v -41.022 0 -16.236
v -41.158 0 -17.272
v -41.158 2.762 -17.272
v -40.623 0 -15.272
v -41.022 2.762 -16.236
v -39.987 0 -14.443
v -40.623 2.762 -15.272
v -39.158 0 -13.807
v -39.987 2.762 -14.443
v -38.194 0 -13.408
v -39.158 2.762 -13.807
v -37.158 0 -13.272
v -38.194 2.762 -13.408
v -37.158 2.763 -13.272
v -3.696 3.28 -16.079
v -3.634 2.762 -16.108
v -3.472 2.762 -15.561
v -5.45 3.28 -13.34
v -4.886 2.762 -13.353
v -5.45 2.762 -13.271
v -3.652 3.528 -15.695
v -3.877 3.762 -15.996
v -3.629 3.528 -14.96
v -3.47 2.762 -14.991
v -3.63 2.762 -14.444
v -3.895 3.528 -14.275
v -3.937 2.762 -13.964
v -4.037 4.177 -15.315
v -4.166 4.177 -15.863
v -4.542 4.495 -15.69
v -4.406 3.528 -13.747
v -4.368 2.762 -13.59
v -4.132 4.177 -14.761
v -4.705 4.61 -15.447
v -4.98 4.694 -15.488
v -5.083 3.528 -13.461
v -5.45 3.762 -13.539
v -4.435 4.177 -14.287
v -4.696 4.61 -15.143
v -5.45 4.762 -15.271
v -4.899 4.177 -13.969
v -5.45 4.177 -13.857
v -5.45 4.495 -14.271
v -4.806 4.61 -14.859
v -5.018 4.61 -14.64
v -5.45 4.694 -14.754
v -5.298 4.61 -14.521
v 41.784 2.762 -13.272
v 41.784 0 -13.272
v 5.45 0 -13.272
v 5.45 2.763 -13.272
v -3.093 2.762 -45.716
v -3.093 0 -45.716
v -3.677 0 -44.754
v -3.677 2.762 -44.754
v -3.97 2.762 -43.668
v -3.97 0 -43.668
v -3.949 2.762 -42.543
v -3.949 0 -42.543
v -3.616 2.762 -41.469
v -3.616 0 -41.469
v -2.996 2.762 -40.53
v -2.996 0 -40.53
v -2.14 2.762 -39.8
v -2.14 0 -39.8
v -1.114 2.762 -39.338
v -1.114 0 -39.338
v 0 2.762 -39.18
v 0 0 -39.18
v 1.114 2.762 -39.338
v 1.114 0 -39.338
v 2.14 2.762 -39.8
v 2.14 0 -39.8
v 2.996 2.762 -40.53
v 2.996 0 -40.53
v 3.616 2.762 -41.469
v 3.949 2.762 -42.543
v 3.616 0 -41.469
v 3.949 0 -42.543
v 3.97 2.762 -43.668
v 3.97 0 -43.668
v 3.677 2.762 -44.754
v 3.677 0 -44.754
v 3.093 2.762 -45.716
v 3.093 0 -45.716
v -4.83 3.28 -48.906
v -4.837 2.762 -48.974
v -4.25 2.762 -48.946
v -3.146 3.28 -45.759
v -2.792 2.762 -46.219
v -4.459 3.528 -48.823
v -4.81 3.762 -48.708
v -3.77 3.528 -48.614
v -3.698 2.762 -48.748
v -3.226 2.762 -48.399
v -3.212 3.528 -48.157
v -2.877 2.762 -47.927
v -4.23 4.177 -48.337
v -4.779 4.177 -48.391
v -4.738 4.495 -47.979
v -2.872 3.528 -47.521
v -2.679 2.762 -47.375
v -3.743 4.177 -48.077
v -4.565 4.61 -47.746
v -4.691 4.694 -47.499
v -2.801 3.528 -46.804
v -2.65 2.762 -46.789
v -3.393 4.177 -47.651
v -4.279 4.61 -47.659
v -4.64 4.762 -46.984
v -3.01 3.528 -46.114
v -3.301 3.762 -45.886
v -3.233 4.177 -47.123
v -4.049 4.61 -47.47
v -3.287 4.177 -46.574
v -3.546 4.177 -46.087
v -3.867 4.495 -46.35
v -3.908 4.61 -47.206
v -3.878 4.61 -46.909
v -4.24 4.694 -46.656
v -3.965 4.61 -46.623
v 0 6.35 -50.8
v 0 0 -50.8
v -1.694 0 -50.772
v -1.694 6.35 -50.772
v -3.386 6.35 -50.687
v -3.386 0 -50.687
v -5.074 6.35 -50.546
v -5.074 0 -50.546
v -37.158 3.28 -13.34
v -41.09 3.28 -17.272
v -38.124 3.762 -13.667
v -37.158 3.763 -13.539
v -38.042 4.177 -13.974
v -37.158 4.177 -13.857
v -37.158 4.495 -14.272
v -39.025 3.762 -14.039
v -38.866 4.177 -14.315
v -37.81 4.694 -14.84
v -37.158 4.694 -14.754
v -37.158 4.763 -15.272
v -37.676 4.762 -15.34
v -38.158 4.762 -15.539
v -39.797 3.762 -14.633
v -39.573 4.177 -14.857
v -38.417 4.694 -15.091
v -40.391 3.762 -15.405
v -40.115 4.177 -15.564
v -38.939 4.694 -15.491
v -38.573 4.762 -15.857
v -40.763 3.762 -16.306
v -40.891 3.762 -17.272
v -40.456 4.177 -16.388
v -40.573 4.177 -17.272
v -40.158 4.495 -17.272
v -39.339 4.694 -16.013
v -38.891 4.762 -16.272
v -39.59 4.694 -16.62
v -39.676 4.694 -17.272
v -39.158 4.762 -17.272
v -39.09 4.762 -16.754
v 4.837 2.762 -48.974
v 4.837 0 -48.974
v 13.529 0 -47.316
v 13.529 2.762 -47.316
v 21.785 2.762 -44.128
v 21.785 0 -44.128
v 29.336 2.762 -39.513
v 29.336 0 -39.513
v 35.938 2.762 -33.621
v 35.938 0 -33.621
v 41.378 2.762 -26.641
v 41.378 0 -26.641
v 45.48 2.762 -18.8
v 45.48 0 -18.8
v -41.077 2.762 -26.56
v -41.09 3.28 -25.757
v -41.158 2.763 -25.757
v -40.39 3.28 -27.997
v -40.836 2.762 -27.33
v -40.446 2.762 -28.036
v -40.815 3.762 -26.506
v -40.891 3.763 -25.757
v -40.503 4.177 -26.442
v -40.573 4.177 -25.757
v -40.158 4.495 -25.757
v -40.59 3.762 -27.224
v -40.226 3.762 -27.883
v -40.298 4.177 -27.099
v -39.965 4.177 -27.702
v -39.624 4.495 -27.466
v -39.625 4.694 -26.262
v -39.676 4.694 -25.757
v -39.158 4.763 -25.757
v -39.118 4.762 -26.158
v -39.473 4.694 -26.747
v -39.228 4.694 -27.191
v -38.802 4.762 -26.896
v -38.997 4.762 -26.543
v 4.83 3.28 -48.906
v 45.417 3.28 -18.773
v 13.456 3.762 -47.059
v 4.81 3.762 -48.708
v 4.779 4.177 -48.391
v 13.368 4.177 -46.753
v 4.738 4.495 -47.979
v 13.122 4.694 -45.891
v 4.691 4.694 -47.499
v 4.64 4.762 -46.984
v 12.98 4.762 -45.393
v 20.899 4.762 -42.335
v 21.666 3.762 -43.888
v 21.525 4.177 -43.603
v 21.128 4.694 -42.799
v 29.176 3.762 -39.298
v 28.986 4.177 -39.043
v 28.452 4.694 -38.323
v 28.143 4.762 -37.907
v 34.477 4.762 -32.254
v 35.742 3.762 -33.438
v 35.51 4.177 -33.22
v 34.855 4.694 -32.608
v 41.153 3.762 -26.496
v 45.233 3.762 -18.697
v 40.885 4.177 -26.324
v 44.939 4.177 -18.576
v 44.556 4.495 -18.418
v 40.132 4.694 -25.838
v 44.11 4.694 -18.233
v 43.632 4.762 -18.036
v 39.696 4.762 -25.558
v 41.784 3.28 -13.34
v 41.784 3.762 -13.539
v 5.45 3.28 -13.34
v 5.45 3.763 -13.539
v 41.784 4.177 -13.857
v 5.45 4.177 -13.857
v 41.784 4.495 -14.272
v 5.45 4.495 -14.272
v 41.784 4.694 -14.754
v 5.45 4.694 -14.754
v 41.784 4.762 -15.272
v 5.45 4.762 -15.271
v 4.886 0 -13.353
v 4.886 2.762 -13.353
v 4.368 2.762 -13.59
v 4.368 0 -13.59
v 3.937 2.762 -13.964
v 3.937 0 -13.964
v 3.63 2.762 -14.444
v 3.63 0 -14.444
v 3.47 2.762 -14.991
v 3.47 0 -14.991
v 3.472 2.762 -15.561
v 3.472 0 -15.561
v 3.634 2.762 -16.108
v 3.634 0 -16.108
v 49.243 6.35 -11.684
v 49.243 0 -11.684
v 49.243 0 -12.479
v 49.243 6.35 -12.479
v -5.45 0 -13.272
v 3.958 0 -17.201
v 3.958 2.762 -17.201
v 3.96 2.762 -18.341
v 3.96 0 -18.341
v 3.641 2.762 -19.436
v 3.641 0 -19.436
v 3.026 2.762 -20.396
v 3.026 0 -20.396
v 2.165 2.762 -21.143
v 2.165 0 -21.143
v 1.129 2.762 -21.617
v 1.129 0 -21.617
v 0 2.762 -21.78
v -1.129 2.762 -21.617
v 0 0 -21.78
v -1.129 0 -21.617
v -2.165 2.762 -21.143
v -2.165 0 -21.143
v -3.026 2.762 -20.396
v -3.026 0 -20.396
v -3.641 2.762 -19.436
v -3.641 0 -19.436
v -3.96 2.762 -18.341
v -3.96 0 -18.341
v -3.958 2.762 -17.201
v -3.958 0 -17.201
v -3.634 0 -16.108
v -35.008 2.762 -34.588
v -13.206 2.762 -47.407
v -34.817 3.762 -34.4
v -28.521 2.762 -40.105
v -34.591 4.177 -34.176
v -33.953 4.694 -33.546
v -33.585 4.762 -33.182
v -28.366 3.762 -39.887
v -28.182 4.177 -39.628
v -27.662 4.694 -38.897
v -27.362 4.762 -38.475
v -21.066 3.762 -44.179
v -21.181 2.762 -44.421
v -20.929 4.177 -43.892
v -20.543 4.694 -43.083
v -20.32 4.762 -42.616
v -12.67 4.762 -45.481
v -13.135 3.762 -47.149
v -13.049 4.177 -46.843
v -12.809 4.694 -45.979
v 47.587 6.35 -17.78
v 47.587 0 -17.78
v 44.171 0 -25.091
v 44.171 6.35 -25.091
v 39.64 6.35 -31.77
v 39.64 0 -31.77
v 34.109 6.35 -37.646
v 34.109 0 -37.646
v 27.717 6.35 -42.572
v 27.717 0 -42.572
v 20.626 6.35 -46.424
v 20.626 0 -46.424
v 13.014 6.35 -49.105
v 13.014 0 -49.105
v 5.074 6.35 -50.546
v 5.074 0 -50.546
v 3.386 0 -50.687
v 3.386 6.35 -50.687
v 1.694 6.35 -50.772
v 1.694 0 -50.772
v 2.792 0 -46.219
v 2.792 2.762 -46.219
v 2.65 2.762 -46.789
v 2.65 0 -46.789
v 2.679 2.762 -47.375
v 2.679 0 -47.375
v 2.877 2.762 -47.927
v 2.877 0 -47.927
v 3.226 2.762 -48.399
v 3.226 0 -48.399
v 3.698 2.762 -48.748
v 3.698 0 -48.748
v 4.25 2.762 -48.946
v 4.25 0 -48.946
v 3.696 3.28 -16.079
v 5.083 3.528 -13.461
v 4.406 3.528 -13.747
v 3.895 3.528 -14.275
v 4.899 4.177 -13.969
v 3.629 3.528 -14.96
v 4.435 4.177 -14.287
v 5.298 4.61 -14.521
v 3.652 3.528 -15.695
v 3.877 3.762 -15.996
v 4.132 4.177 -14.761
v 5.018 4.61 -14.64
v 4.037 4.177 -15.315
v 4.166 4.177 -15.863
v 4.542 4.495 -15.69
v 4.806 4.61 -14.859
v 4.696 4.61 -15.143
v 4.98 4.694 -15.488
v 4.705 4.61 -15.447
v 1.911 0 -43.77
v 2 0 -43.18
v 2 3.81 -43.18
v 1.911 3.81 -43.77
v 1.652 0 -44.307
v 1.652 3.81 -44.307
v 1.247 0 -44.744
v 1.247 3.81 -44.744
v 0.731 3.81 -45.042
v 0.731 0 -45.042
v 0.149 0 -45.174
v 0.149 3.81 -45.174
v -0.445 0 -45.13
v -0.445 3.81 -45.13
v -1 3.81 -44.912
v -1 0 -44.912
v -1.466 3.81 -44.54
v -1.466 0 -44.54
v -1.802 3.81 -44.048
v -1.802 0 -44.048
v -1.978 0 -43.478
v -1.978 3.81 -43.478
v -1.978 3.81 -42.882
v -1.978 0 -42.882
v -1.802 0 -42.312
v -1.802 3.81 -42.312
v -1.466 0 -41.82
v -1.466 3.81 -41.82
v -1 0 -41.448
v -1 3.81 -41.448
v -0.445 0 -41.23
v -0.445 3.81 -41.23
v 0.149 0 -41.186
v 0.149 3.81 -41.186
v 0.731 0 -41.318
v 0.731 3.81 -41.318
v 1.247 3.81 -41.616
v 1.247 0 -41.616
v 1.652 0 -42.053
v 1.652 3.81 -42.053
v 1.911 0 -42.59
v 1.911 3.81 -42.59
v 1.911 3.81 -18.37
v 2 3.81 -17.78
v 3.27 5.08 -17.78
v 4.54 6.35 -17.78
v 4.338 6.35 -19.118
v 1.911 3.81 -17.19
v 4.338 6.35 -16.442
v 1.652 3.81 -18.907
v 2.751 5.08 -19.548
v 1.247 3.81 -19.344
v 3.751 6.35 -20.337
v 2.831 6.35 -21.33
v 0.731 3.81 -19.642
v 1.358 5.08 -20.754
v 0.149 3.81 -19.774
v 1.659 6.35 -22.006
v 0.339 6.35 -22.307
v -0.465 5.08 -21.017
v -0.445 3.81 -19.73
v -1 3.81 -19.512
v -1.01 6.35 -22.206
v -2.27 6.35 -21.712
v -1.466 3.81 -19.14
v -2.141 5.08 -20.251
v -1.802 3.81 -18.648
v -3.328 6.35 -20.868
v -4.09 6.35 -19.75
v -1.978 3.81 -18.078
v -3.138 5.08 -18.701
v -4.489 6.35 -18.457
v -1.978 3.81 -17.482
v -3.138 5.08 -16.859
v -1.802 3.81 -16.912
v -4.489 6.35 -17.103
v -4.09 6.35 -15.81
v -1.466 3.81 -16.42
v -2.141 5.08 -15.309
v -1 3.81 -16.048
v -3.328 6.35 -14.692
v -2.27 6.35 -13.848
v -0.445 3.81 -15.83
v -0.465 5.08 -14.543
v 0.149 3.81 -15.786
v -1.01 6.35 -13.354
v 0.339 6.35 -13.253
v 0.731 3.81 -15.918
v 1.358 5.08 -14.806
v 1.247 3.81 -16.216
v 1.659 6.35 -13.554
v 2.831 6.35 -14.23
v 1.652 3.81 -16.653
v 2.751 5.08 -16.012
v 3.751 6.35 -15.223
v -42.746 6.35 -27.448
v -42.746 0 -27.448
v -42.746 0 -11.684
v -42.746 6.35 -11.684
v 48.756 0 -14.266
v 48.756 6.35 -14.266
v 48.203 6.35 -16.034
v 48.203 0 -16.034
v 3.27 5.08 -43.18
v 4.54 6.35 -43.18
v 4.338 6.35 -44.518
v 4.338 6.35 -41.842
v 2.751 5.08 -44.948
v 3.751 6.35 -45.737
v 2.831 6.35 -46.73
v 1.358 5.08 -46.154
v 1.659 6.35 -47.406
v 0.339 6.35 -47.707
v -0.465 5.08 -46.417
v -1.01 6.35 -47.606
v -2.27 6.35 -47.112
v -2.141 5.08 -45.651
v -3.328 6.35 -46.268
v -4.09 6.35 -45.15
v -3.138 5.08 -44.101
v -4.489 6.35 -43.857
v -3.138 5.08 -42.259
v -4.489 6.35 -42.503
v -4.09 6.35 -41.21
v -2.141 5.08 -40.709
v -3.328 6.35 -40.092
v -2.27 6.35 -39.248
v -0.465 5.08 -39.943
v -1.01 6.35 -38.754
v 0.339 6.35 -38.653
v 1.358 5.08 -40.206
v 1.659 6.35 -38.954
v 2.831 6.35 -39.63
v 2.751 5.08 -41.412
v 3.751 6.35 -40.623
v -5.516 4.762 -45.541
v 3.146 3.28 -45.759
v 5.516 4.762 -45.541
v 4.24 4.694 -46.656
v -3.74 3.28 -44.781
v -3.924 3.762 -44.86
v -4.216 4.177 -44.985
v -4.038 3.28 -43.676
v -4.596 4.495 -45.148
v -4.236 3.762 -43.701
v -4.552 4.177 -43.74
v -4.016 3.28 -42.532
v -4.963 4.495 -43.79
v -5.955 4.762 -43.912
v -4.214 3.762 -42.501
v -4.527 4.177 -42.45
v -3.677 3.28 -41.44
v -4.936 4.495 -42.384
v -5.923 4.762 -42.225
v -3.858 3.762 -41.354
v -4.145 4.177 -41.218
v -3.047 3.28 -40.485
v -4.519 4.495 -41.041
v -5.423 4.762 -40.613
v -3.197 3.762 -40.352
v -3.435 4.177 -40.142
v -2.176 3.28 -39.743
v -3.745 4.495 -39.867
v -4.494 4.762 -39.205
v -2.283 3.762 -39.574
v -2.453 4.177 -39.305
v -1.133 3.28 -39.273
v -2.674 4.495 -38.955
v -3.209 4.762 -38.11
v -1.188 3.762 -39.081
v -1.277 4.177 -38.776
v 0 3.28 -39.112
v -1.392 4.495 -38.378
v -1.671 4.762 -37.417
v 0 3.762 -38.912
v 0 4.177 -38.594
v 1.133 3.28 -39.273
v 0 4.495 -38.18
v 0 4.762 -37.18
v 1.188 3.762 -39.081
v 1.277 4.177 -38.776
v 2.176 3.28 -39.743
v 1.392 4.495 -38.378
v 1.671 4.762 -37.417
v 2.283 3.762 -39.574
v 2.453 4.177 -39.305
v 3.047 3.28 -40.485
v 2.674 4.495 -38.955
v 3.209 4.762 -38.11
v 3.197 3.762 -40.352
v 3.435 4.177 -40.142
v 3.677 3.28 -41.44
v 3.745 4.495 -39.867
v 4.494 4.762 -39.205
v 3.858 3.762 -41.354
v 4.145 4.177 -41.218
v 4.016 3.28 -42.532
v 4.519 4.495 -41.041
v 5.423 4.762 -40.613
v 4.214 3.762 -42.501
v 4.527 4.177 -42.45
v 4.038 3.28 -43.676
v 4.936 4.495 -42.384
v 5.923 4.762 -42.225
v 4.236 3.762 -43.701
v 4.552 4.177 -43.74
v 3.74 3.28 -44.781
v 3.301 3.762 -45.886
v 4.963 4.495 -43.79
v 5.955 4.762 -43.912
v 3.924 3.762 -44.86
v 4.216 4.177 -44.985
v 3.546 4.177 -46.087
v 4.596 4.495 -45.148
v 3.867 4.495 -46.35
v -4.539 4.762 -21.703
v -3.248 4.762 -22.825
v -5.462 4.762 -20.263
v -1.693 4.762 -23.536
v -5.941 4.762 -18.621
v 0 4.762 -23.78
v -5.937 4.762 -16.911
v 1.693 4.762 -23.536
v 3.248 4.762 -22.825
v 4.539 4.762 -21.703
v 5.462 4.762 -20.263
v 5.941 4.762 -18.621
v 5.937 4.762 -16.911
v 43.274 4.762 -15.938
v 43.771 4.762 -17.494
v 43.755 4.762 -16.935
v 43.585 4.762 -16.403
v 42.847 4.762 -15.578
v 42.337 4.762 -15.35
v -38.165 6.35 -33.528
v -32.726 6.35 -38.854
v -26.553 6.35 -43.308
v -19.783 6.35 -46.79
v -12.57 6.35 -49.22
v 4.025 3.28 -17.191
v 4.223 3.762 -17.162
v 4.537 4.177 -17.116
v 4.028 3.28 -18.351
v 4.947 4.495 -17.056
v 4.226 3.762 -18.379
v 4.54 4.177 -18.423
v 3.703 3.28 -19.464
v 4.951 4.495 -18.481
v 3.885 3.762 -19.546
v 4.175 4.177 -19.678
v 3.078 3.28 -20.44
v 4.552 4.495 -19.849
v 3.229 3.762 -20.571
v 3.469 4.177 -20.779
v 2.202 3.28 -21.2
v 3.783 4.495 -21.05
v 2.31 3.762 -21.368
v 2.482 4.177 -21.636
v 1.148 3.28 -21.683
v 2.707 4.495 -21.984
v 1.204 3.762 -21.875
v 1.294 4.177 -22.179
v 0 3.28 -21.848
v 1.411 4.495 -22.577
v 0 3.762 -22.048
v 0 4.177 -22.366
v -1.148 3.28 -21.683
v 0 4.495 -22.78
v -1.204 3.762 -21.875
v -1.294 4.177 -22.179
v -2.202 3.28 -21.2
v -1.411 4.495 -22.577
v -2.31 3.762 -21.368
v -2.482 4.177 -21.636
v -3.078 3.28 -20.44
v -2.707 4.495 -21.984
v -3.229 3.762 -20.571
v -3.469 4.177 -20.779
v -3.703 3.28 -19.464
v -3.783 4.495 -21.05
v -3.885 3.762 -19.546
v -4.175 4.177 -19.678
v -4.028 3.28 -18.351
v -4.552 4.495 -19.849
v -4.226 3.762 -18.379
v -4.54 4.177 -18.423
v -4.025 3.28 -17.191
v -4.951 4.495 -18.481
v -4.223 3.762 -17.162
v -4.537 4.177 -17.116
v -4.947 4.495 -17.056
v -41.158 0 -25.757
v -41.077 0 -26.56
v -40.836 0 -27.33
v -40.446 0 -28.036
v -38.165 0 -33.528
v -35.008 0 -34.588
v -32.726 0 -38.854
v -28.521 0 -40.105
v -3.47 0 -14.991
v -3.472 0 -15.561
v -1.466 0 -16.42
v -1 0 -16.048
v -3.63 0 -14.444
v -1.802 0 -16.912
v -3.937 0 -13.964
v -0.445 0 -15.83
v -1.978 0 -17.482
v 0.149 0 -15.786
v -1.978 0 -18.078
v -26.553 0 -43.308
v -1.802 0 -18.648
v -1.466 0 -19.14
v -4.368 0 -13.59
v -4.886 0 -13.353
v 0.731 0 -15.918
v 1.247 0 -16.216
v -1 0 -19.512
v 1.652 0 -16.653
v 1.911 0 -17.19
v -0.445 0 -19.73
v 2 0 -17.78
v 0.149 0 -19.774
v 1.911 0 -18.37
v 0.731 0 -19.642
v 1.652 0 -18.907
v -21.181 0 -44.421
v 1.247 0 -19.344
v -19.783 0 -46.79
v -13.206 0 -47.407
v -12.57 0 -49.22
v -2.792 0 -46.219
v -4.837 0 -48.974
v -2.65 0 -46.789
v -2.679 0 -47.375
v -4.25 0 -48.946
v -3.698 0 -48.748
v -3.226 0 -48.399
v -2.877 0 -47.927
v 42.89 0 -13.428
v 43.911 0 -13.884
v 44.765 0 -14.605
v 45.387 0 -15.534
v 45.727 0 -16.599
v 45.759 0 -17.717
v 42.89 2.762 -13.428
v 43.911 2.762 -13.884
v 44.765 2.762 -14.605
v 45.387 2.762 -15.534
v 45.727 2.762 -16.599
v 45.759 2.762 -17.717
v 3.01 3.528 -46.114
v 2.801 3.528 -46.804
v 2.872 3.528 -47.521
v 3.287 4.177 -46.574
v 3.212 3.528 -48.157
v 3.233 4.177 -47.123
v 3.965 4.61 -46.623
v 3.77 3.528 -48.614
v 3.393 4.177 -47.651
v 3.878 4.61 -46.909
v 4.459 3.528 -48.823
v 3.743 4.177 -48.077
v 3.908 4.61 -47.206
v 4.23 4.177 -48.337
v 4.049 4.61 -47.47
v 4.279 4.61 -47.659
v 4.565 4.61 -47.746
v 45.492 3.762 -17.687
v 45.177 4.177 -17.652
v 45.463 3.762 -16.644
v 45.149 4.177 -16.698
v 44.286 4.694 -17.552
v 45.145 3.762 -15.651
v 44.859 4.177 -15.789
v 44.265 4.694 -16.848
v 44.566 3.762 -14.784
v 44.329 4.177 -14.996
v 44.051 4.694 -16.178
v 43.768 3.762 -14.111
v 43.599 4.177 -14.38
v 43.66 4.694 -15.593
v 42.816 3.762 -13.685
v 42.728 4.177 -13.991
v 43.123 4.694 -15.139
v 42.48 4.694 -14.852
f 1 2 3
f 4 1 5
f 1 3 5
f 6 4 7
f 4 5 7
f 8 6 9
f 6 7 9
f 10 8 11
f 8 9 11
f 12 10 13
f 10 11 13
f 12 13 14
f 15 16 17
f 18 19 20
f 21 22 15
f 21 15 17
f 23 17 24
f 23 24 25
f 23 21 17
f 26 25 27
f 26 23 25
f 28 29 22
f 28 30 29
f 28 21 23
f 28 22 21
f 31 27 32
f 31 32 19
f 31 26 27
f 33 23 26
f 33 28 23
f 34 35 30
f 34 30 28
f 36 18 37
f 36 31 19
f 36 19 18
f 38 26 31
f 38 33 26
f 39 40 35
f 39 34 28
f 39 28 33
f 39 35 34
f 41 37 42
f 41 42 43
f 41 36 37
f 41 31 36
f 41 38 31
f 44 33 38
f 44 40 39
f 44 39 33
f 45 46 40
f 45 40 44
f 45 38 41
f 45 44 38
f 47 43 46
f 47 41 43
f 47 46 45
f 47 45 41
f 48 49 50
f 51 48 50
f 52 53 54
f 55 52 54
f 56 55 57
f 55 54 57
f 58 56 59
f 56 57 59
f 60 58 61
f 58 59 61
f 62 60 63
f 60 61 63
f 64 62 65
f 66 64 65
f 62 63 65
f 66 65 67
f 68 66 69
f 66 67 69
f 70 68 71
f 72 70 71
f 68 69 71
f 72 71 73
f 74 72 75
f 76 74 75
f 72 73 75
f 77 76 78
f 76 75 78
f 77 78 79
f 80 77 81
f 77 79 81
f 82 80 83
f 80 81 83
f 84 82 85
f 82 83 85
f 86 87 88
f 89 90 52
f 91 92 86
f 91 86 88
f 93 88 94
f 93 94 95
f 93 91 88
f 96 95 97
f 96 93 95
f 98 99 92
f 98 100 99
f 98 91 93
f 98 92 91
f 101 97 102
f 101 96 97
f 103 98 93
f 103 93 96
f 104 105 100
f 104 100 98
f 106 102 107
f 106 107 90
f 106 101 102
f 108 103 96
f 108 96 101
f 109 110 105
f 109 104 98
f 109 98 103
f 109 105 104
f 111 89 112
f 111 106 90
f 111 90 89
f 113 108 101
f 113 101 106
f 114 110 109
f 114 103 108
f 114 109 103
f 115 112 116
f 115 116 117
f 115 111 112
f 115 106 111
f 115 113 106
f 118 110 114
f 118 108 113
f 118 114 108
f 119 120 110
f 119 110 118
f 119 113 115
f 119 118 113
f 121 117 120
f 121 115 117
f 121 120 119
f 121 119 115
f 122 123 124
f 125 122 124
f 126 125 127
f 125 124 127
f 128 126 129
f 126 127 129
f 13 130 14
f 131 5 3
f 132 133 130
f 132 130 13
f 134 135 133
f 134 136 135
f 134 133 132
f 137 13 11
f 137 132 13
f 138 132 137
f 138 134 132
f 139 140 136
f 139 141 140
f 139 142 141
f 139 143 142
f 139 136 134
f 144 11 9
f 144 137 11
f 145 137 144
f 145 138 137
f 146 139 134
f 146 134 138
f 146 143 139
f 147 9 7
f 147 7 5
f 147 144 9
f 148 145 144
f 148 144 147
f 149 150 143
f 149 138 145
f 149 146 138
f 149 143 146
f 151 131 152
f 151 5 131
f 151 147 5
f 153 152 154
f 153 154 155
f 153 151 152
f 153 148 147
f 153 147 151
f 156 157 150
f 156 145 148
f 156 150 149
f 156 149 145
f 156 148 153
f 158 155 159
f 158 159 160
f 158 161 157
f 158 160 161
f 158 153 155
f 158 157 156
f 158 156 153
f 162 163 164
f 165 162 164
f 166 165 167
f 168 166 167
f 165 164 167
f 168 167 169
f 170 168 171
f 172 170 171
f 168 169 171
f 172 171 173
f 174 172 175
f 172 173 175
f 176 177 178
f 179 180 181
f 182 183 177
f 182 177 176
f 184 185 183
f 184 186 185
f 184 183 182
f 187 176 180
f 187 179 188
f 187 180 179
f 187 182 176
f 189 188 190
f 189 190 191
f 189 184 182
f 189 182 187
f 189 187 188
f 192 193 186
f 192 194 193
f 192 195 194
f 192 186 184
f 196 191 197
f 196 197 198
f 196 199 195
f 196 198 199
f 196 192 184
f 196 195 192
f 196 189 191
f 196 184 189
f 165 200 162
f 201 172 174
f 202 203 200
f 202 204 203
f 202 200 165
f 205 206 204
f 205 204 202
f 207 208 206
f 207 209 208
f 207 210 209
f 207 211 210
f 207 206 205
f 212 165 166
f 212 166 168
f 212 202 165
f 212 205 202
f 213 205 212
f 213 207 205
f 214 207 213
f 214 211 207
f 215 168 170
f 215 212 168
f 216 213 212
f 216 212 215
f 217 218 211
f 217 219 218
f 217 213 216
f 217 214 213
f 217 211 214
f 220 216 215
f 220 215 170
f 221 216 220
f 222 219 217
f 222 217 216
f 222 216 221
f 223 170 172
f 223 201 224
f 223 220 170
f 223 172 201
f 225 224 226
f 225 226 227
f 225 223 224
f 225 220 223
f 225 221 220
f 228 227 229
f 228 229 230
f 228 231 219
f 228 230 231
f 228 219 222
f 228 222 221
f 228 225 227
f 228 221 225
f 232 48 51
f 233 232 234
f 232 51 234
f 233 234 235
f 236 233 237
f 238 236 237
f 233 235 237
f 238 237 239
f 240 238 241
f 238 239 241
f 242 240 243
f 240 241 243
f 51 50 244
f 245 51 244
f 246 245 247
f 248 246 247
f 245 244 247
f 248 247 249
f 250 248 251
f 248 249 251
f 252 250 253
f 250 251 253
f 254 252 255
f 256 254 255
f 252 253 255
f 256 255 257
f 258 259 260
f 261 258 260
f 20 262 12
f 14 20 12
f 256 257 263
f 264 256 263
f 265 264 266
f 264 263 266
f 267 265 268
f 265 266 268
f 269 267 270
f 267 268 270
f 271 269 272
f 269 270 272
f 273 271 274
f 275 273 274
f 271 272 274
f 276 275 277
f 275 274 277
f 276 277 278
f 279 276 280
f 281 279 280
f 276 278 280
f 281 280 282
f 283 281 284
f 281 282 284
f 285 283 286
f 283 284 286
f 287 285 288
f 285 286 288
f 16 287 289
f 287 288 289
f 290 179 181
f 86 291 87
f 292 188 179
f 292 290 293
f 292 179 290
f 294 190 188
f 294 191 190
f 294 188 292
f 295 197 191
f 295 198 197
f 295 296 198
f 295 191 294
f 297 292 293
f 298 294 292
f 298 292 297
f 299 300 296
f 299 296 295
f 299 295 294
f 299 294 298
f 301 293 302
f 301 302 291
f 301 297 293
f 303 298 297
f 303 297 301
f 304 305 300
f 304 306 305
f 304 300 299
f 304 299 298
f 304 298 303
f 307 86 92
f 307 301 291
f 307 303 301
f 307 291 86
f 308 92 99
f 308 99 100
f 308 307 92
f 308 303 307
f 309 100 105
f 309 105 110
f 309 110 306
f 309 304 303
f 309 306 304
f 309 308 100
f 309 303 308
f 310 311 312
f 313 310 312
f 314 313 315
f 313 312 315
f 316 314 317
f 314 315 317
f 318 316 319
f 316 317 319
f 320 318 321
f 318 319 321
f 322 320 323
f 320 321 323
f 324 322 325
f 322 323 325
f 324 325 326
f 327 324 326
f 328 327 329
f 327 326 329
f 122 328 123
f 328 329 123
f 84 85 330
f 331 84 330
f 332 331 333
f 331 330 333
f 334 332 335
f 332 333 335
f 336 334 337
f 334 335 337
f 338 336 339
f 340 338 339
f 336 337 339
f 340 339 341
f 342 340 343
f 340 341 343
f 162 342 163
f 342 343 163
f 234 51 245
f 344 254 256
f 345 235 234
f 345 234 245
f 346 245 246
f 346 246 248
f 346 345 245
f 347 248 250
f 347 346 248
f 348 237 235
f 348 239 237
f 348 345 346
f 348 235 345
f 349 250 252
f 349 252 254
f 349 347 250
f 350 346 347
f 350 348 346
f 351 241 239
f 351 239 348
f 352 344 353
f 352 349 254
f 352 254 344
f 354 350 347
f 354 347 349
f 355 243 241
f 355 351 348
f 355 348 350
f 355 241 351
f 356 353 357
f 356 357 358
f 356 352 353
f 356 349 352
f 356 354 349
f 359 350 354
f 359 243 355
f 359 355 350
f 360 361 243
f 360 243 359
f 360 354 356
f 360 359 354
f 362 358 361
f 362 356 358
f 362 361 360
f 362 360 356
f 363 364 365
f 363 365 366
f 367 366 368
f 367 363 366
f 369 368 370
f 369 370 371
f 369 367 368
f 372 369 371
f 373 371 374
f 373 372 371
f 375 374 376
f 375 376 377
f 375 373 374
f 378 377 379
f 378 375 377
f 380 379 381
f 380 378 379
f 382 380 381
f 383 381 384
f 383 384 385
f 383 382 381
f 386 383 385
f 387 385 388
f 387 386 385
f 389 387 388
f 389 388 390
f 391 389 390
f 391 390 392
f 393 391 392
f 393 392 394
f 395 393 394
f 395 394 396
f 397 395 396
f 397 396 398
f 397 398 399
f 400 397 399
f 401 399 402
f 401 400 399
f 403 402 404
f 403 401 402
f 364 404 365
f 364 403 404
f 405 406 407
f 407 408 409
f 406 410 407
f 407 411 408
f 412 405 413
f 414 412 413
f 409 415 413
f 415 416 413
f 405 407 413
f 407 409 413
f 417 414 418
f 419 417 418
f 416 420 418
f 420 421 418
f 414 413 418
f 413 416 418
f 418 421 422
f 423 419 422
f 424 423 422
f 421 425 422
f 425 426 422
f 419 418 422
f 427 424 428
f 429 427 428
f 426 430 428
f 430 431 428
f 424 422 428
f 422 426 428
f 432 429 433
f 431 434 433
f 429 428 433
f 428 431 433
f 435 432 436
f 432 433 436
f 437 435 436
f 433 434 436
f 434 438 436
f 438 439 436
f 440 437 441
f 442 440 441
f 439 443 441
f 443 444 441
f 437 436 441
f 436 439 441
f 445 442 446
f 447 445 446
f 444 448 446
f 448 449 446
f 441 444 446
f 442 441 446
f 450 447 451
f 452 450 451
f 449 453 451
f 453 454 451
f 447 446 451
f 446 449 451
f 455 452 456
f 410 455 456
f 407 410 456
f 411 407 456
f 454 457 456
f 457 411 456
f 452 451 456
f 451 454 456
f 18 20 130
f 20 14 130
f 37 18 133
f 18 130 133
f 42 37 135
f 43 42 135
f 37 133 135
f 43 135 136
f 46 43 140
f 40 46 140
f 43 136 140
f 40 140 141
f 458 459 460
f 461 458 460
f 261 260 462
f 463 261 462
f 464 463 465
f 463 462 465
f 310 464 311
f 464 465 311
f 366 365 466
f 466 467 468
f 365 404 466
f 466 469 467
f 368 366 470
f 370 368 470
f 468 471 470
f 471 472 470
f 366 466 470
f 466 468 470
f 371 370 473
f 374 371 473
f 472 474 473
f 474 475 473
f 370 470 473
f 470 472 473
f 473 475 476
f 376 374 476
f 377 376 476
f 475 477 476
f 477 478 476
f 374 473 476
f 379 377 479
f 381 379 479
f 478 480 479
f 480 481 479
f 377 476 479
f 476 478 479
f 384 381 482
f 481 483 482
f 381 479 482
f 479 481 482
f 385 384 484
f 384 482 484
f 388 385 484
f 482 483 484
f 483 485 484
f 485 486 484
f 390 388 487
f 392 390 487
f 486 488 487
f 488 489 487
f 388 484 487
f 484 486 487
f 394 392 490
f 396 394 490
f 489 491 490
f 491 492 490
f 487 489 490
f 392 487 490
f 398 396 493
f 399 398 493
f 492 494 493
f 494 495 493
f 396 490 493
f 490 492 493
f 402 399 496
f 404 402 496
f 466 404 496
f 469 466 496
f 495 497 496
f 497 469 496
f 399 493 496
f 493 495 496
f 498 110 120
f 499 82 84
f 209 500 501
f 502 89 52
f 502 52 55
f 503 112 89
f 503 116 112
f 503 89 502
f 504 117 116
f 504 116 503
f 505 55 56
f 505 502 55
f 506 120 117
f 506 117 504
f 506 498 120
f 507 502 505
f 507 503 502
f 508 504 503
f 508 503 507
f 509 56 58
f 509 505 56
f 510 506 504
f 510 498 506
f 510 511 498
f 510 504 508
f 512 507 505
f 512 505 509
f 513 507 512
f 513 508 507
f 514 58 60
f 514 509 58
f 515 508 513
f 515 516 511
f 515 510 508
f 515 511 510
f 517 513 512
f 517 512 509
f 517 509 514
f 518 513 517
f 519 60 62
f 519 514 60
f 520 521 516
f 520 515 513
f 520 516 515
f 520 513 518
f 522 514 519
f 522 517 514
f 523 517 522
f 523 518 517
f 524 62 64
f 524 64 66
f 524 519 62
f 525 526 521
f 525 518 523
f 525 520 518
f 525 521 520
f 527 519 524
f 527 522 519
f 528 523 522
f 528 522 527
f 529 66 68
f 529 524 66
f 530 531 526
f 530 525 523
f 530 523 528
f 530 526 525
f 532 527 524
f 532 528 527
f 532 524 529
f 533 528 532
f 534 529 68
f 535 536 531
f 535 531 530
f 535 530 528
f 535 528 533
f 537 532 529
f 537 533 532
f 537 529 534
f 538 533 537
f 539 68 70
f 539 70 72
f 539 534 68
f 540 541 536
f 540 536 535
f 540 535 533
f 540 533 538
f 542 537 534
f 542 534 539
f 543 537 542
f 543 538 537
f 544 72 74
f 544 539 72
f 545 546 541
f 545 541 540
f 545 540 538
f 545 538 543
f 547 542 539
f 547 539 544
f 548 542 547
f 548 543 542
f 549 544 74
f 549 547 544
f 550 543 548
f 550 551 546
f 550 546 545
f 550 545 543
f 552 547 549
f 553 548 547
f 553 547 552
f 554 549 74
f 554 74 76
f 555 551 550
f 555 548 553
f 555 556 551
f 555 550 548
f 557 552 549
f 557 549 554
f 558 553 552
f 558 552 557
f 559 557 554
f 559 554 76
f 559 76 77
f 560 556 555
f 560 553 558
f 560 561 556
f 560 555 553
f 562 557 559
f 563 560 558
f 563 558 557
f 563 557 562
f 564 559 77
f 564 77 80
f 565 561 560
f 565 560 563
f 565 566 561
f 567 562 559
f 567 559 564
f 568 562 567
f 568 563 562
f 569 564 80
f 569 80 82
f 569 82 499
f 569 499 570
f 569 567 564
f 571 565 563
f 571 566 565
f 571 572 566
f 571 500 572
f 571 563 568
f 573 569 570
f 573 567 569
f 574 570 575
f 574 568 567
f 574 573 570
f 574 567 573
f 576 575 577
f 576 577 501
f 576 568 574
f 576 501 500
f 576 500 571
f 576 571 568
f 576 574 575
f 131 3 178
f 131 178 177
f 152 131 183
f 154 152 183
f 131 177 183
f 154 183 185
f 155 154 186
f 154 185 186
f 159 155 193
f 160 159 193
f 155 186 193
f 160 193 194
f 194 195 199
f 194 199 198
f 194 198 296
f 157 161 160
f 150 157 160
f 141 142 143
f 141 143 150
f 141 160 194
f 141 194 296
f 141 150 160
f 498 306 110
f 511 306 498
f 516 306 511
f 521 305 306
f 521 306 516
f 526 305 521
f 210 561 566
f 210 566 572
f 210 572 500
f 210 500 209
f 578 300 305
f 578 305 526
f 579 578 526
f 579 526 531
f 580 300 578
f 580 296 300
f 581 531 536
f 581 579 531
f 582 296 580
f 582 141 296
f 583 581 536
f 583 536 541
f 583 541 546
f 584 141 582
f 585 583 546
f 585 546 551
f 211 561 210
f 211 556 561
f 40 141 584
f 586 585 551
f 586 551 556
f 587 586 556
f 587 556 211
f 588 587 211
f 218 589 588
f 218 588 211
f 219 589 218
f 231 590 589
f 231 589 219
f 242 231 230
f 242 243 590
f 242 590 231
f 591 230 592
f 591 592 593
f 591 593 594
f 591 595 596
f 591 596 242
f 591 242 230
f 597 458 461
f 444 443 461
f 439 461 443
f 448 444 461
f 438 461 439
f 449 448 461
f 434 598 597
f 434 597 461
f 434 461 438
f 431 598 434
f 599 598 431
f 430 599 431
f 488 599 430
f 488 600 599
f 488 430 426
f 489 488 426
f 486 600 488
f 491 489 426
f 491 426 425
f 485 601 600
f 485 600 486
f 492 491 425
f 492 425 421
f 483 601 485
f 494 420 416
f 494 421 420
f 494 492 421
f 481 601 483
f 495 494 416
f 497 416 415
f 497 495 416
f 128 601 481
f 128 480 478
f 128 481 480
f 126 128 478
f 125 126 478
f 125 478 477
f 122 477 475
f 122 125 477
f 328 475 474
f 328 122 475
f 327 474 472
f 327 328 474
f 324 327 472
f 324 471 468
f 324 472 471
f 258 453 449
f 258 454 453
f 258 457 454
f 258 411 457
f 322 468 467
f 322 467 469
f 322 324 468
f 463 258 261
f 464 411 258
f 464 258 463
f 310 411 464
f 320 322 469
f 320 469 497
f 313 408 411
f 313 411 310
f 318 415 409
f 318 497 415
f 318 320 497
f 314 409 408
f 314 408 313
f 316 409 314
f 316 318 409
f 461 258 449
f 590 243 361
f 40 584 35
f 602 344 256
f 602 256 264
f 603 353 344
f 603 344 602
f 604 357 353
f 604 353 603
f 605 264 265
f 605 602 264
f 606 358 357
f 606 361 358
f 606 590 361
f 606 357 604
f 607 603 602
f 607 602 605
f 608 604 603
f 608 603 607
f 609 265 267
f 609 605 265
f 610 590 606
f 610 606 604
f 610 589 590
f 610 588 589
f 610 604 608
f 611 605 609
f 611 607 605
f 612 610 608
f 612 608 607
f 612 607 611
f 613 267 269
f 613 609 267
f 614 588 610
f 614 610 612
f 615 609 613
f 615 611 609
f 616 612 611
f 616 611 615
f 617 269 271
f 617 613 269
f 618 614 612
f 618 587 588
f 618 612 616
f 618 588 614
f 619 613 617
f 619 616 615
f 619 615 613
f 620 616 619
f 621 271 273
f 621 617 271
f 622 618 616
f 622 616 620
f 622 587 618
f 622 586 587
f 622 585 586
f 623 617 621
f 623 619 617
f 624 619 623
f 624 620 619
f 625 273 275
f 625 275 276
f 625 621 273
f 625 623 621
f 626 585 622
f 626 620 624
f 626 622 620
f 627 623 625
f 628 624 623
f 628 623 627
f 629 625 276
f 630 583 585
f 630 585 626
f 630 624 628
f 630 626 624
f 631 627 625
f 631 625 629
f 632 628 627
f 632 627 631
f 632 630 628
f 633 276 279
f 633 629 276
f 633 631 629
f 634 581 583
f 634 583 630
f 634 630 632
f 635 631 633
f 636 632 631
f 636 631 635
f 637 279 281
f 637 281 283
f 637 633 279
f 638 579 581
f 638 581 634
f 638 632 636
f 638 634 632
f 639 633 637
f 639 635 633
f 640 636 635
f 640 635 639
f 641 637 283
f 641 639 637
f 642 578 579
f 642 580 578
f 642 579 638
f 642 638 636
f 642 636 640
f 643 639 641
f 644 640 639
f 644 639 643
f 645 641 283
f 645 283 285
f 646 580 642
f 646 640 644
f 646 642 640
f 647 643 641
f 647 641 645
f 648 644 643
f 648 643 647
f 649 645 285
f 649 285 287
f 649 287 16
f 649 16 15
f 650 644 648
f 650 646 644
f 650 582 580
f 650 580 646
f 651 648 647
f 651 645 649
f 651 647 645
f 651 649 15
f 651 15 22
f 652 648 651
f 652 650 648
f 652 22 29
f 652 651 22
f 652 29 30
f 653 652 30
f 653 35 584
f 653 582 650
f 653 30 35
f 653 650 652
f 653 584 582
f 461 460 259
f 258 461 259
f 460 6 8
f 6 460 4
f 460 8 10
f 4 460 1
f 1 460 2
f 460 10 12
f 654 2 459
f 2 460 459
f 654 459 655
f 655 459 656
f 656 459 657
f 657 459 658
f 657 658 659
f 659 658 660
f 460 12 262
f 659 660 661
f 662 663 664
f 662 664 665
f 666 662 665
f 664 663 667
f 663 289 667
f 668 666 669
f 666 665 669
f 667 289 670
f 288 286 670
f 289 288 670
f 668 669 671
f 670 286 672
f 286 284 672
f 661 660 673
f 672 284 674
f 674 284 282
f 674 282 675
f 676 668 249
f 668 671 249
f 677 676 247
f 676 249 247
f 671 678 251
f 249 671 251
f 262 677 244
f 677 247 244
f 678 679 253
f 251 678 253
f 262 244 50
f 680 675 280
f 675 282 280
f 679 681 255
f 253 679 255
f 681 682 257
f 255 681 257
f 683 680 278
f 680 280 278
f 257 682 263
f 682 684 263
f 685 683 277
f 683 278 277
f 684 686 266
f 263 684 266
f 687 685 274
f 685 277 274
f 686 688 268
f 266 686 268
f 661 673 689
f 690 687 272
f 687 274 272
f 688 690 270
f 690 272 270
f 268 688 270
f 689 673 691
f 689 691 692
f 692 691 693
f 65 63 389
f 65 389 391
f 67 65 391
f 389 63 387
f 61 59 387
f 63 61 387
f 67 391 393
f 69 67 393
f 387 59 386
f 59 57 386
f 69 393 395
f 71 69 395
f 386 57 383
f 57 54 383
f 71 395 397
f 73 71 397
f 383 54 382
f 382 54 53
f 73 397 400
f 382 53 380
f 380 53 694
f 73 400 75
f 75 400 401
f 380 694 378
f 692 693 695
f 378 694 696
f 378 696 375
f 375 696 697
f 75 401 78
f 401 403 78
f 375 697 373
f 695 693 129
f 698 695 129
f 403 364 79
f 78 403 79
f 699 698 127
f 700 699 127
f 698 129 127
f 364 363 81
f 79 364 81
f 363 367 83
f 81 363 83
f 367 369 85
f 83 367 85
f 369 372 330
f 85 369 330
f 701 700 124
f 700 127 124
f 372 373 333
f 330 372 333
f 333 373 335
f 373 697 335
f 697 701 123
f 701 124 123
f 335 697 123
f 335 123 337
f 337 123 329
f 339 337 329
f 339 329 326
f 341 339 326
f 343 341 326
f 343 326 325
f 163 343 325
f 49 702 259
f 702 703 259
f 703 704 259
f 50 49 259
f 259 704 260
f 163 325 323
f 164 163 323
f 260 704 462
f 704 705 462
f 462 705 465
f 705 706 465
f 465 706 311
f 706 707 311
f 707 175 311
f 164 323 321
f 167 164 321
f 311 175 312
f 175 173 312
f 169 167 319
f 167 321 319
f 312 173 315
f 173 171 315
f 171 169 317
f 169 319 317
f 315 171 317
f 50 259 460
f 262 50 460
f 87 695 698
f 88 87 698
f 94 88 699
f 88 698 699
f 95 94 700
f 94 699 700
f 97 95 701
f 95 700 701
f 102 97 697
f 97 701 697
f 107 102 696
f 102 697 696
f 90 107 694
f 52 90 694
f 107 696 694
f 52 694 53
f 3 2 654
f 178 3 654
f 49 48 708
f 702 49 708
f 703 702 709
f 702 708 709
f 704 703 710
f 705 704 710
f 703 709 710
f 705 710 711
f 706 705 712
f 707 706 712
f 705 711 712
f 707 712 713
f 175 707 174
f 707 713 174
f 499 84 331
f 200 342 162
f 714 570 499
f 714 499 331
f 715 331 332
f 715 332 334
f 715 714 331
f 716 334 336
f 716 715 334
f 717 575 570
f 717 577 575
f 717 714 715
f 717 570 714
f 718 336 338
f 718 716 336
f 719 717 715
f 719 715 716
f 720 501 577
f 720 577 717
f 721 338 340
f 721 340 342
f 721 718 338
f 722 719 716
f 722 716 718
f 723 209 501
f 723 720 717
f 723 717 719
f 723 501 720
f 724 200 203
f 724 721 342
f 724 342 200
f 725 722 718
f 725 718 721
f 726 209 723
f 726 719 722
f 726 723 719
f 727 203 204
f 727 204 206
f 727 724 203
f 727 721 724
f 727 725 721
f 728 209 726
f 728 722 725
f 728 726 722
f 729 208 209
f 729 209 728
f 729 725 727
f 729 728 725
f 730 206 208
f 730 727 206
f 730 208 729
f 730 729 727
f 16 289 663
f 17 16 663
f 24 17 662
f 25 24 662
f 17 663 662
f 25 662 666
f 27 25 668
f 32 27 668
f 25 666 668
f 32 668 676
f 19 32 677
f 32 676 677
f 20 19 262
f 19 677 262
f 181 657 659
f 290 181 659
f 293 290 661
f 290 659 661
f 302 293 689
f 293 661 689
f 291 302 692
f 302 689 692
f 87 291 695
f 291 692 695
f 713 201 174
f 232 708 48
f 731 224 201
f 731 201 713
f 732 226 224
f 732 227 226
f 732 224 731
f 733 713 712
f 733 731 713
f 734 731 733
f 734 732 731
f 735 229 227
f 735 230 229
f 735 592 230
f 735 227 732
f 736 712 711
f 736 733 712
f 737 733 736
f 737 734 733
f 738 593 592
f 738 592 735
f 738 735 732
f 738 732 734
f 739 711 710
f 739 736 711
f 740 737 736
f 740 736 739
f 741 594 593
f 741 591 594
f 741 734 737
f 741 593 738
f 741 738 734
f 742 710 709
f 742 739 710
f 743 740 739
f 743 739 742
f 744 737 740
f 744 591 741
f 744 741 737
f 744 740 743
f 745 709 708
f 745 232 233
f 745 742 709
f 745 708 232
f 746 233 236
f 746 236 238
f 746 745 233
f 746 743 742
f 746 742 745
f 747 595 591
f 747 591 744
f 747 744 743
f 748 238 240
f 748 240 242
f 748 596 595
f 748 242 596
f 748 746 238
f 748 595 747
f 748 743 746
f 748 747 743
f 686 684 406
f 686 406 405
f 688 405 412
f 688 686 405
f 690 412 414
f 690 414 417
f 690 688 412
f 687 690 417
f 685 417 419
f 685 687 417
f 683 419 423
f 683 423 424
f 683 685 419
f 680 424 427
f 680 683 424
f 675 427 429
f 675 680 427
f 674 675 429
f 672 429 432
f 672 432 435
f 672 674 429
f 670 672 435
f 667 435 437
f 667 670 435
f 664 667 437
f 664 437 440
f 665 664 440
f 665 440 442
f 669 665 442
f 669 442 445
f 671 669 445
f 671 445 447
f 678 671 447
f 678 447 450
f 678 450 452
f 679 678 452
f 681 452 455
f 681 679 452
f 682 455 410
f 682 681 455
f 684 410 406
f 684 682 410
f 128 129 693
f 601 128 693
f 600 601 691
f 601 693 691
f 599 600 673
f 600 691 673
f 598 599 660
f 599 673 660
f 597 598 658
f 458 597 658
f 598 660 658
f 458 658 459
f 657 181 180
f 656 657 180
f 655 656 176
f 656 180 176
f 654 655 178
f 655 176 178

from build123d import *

# Parameters (mm, degrees)
SKETCH1_R           = 2
BOSS_EXTRUDE1_DEPTH = 6.35
CHAMFER1_SIZE       = 2.54
CUT_EXTRUDE1_DEPTH  = 4.7625
FILLET1_R           = 4
FILLET2_R           = 2


with BuildPart() as part:
    # Sketch1 → Boss-Extrude1 (new body)
    with BuildSketch(Plane(origin=(0, 0, 0), x_dir=(1, 0, 0), z_dir=(0, 1, 0))):
        with BuildLine():
            Line((-42.746, 11.684), (47.586884748, 11.684))
            Line((47.586884748, 11.684), (47.586884748, 17.78))
            ThreePointArc((47.586884748, 17.78), (31.011055518, 40.236232871), (5.073646026, 50.546))
            Line((5.073646026, 50.546), (-5.073646026, 50.546))
            ThreePointArc((-5.073646026, 50.546), (-26.552841725, 43.308043091), (-42.746, 27.448487827))
            Line((-42.746, 27.448487827), (-42.746, 11.684))
        make_face()
        with Locations((0, 17.78)):
            Circle(SKETCH1_R, mode=Mode.SUBTRACT)
        with Locations((0, 43.18)):
            Circle(SKETCH1_R, mode=Mode.SUBTRACT)
        with BuildLine():
            Line((47.586884748, 17.78), (47.586884748, 11.684))
            Line((47.586884748, 11.684), (49.243425186, 11.684))
            Line((49.243425186, 11.684), (49.243425186, 12.478985375))
            ThreePointArc((49.243425186, 12.478985375), (48.487652237, 15.15214772), (47.586884748, 17.78))
        make_face()
        with BuildLine():
            Line((-5.073646026, 50.546), (5.073646026, 50.546))
            ThreePointArc((5.073646026, 50.546), (2.539999948, 50.736460265), (-1.05e-07, 50.8))
            ThreePointArc((-1.05e-07, 50.8), (-2.540000052, 50.73646026), (-5.073646026, 50.546))
        make_face()
    extrude(amount=BOSS_EXTRUDE1_DEPTH)

    # Chamfer1
    chamfer1_edges = [part.edges().sort_by_distance(p)[0] for p in [
        (-2, 6.35, -17.78),
        (-2, 6.35, -43.18),
    ]]
    chamfer(chamfer1_edges, length=CHAMFER1_SIZE)

    # Sketch2 → Cut-Extrude1 (cut)
    with BuildSketch(Plane.XZ):
        with BuildLine():
            ThreePointArc((4.836612521, -48.974251761), (31.631563601, -37.700322816), (47.389212317, -13.2715))
            Line((47.389212317, -13.2715), (5.450452083, -13.2715))
            ThreePointArc((5.450452083, -13.2715), (3.766359845, -14.192688904), (3.633634696, -16.107666631))
            ThreePointArc((3.633634696, -16.107666631), (1e-09, -21.78), (-3.633634697, -16.107666633))
            ThreePointArc((-3.633634697, -16.107666633), (-3.766359842, -14.192688907), (-5.450452076, -13.2715))
            Line((-5.450452076, -13.2715), (-41.1585, -13.2715))
            Line((-41.1585, -13.2715), (-41.1585, -26.978658862))
            ThreePointArc((-41.1585, -26.978658862), (-25.491942293, -42.09549898), (-4.836612574, -48.974251756))
            ThreePointArc((-4.836612574, -48.974251756), (-2.876580864, -47.927421723), (-3.093368257, -45.715955999))
            ThreePointArc((-3.093368257, -45.715955999), (1e-09, -39.18), (3.093368255, -45.715956001))
            ThreePointArc((3.093368255, -45.715956001), (2.876580852, -47.927421701), (4.836612521, -48.974251761))
        make_face()
    extrude(amount=-CUT_EXTRUDE1_DEPTH, mode=Mode.SUBTRACT)

    # Fillet1
    fillet1_edges = [part.edges().sort_by_distance(p)[0] for p in [
        (47.389212317, 2.38125, -13.2715),
        (-41.1585, 2.38125, -13.2715),
        (-41.1585, 2.38125, -26.978658862),
    ]]
    fillet(fillet1_edges, radius=FILLET1_R)

    # Fillet2
    fillet2_edges = [part.edges().sort_by_distance(p)[0] for p in [
        (1e-09, 4.7625, -21.78),
        (1e-09, 4.7625, -39.18),
        (-2.876580864, 4.7625, -47.927421723),
        (2.876580852, 4.7625, -47.927421701),
        (29.335536204, 4.7625, -39.513244259),
        (3.766359845, 4.7625, -14.192688904),
        (-3.766359842, 4.7625, -14.192688907),
        (-21.304476038, 4.7625, -13.2715),
        (23.617003395, 4.7625, -13.2715),
        (-24.944627959, 4.7625, -42.422113246),
        (-41.1585, 4.7625, -21.514181912),
        (-39.986927125, 4.7625, -14.443072875),
        (-40.976209704, 4.7625, -26.950636255),
        (45.108619745, 4.7625, -15.048002194),
    ]]
    fillet(fillet2_edges, radius=FILLET2_R)


solid = part.part
